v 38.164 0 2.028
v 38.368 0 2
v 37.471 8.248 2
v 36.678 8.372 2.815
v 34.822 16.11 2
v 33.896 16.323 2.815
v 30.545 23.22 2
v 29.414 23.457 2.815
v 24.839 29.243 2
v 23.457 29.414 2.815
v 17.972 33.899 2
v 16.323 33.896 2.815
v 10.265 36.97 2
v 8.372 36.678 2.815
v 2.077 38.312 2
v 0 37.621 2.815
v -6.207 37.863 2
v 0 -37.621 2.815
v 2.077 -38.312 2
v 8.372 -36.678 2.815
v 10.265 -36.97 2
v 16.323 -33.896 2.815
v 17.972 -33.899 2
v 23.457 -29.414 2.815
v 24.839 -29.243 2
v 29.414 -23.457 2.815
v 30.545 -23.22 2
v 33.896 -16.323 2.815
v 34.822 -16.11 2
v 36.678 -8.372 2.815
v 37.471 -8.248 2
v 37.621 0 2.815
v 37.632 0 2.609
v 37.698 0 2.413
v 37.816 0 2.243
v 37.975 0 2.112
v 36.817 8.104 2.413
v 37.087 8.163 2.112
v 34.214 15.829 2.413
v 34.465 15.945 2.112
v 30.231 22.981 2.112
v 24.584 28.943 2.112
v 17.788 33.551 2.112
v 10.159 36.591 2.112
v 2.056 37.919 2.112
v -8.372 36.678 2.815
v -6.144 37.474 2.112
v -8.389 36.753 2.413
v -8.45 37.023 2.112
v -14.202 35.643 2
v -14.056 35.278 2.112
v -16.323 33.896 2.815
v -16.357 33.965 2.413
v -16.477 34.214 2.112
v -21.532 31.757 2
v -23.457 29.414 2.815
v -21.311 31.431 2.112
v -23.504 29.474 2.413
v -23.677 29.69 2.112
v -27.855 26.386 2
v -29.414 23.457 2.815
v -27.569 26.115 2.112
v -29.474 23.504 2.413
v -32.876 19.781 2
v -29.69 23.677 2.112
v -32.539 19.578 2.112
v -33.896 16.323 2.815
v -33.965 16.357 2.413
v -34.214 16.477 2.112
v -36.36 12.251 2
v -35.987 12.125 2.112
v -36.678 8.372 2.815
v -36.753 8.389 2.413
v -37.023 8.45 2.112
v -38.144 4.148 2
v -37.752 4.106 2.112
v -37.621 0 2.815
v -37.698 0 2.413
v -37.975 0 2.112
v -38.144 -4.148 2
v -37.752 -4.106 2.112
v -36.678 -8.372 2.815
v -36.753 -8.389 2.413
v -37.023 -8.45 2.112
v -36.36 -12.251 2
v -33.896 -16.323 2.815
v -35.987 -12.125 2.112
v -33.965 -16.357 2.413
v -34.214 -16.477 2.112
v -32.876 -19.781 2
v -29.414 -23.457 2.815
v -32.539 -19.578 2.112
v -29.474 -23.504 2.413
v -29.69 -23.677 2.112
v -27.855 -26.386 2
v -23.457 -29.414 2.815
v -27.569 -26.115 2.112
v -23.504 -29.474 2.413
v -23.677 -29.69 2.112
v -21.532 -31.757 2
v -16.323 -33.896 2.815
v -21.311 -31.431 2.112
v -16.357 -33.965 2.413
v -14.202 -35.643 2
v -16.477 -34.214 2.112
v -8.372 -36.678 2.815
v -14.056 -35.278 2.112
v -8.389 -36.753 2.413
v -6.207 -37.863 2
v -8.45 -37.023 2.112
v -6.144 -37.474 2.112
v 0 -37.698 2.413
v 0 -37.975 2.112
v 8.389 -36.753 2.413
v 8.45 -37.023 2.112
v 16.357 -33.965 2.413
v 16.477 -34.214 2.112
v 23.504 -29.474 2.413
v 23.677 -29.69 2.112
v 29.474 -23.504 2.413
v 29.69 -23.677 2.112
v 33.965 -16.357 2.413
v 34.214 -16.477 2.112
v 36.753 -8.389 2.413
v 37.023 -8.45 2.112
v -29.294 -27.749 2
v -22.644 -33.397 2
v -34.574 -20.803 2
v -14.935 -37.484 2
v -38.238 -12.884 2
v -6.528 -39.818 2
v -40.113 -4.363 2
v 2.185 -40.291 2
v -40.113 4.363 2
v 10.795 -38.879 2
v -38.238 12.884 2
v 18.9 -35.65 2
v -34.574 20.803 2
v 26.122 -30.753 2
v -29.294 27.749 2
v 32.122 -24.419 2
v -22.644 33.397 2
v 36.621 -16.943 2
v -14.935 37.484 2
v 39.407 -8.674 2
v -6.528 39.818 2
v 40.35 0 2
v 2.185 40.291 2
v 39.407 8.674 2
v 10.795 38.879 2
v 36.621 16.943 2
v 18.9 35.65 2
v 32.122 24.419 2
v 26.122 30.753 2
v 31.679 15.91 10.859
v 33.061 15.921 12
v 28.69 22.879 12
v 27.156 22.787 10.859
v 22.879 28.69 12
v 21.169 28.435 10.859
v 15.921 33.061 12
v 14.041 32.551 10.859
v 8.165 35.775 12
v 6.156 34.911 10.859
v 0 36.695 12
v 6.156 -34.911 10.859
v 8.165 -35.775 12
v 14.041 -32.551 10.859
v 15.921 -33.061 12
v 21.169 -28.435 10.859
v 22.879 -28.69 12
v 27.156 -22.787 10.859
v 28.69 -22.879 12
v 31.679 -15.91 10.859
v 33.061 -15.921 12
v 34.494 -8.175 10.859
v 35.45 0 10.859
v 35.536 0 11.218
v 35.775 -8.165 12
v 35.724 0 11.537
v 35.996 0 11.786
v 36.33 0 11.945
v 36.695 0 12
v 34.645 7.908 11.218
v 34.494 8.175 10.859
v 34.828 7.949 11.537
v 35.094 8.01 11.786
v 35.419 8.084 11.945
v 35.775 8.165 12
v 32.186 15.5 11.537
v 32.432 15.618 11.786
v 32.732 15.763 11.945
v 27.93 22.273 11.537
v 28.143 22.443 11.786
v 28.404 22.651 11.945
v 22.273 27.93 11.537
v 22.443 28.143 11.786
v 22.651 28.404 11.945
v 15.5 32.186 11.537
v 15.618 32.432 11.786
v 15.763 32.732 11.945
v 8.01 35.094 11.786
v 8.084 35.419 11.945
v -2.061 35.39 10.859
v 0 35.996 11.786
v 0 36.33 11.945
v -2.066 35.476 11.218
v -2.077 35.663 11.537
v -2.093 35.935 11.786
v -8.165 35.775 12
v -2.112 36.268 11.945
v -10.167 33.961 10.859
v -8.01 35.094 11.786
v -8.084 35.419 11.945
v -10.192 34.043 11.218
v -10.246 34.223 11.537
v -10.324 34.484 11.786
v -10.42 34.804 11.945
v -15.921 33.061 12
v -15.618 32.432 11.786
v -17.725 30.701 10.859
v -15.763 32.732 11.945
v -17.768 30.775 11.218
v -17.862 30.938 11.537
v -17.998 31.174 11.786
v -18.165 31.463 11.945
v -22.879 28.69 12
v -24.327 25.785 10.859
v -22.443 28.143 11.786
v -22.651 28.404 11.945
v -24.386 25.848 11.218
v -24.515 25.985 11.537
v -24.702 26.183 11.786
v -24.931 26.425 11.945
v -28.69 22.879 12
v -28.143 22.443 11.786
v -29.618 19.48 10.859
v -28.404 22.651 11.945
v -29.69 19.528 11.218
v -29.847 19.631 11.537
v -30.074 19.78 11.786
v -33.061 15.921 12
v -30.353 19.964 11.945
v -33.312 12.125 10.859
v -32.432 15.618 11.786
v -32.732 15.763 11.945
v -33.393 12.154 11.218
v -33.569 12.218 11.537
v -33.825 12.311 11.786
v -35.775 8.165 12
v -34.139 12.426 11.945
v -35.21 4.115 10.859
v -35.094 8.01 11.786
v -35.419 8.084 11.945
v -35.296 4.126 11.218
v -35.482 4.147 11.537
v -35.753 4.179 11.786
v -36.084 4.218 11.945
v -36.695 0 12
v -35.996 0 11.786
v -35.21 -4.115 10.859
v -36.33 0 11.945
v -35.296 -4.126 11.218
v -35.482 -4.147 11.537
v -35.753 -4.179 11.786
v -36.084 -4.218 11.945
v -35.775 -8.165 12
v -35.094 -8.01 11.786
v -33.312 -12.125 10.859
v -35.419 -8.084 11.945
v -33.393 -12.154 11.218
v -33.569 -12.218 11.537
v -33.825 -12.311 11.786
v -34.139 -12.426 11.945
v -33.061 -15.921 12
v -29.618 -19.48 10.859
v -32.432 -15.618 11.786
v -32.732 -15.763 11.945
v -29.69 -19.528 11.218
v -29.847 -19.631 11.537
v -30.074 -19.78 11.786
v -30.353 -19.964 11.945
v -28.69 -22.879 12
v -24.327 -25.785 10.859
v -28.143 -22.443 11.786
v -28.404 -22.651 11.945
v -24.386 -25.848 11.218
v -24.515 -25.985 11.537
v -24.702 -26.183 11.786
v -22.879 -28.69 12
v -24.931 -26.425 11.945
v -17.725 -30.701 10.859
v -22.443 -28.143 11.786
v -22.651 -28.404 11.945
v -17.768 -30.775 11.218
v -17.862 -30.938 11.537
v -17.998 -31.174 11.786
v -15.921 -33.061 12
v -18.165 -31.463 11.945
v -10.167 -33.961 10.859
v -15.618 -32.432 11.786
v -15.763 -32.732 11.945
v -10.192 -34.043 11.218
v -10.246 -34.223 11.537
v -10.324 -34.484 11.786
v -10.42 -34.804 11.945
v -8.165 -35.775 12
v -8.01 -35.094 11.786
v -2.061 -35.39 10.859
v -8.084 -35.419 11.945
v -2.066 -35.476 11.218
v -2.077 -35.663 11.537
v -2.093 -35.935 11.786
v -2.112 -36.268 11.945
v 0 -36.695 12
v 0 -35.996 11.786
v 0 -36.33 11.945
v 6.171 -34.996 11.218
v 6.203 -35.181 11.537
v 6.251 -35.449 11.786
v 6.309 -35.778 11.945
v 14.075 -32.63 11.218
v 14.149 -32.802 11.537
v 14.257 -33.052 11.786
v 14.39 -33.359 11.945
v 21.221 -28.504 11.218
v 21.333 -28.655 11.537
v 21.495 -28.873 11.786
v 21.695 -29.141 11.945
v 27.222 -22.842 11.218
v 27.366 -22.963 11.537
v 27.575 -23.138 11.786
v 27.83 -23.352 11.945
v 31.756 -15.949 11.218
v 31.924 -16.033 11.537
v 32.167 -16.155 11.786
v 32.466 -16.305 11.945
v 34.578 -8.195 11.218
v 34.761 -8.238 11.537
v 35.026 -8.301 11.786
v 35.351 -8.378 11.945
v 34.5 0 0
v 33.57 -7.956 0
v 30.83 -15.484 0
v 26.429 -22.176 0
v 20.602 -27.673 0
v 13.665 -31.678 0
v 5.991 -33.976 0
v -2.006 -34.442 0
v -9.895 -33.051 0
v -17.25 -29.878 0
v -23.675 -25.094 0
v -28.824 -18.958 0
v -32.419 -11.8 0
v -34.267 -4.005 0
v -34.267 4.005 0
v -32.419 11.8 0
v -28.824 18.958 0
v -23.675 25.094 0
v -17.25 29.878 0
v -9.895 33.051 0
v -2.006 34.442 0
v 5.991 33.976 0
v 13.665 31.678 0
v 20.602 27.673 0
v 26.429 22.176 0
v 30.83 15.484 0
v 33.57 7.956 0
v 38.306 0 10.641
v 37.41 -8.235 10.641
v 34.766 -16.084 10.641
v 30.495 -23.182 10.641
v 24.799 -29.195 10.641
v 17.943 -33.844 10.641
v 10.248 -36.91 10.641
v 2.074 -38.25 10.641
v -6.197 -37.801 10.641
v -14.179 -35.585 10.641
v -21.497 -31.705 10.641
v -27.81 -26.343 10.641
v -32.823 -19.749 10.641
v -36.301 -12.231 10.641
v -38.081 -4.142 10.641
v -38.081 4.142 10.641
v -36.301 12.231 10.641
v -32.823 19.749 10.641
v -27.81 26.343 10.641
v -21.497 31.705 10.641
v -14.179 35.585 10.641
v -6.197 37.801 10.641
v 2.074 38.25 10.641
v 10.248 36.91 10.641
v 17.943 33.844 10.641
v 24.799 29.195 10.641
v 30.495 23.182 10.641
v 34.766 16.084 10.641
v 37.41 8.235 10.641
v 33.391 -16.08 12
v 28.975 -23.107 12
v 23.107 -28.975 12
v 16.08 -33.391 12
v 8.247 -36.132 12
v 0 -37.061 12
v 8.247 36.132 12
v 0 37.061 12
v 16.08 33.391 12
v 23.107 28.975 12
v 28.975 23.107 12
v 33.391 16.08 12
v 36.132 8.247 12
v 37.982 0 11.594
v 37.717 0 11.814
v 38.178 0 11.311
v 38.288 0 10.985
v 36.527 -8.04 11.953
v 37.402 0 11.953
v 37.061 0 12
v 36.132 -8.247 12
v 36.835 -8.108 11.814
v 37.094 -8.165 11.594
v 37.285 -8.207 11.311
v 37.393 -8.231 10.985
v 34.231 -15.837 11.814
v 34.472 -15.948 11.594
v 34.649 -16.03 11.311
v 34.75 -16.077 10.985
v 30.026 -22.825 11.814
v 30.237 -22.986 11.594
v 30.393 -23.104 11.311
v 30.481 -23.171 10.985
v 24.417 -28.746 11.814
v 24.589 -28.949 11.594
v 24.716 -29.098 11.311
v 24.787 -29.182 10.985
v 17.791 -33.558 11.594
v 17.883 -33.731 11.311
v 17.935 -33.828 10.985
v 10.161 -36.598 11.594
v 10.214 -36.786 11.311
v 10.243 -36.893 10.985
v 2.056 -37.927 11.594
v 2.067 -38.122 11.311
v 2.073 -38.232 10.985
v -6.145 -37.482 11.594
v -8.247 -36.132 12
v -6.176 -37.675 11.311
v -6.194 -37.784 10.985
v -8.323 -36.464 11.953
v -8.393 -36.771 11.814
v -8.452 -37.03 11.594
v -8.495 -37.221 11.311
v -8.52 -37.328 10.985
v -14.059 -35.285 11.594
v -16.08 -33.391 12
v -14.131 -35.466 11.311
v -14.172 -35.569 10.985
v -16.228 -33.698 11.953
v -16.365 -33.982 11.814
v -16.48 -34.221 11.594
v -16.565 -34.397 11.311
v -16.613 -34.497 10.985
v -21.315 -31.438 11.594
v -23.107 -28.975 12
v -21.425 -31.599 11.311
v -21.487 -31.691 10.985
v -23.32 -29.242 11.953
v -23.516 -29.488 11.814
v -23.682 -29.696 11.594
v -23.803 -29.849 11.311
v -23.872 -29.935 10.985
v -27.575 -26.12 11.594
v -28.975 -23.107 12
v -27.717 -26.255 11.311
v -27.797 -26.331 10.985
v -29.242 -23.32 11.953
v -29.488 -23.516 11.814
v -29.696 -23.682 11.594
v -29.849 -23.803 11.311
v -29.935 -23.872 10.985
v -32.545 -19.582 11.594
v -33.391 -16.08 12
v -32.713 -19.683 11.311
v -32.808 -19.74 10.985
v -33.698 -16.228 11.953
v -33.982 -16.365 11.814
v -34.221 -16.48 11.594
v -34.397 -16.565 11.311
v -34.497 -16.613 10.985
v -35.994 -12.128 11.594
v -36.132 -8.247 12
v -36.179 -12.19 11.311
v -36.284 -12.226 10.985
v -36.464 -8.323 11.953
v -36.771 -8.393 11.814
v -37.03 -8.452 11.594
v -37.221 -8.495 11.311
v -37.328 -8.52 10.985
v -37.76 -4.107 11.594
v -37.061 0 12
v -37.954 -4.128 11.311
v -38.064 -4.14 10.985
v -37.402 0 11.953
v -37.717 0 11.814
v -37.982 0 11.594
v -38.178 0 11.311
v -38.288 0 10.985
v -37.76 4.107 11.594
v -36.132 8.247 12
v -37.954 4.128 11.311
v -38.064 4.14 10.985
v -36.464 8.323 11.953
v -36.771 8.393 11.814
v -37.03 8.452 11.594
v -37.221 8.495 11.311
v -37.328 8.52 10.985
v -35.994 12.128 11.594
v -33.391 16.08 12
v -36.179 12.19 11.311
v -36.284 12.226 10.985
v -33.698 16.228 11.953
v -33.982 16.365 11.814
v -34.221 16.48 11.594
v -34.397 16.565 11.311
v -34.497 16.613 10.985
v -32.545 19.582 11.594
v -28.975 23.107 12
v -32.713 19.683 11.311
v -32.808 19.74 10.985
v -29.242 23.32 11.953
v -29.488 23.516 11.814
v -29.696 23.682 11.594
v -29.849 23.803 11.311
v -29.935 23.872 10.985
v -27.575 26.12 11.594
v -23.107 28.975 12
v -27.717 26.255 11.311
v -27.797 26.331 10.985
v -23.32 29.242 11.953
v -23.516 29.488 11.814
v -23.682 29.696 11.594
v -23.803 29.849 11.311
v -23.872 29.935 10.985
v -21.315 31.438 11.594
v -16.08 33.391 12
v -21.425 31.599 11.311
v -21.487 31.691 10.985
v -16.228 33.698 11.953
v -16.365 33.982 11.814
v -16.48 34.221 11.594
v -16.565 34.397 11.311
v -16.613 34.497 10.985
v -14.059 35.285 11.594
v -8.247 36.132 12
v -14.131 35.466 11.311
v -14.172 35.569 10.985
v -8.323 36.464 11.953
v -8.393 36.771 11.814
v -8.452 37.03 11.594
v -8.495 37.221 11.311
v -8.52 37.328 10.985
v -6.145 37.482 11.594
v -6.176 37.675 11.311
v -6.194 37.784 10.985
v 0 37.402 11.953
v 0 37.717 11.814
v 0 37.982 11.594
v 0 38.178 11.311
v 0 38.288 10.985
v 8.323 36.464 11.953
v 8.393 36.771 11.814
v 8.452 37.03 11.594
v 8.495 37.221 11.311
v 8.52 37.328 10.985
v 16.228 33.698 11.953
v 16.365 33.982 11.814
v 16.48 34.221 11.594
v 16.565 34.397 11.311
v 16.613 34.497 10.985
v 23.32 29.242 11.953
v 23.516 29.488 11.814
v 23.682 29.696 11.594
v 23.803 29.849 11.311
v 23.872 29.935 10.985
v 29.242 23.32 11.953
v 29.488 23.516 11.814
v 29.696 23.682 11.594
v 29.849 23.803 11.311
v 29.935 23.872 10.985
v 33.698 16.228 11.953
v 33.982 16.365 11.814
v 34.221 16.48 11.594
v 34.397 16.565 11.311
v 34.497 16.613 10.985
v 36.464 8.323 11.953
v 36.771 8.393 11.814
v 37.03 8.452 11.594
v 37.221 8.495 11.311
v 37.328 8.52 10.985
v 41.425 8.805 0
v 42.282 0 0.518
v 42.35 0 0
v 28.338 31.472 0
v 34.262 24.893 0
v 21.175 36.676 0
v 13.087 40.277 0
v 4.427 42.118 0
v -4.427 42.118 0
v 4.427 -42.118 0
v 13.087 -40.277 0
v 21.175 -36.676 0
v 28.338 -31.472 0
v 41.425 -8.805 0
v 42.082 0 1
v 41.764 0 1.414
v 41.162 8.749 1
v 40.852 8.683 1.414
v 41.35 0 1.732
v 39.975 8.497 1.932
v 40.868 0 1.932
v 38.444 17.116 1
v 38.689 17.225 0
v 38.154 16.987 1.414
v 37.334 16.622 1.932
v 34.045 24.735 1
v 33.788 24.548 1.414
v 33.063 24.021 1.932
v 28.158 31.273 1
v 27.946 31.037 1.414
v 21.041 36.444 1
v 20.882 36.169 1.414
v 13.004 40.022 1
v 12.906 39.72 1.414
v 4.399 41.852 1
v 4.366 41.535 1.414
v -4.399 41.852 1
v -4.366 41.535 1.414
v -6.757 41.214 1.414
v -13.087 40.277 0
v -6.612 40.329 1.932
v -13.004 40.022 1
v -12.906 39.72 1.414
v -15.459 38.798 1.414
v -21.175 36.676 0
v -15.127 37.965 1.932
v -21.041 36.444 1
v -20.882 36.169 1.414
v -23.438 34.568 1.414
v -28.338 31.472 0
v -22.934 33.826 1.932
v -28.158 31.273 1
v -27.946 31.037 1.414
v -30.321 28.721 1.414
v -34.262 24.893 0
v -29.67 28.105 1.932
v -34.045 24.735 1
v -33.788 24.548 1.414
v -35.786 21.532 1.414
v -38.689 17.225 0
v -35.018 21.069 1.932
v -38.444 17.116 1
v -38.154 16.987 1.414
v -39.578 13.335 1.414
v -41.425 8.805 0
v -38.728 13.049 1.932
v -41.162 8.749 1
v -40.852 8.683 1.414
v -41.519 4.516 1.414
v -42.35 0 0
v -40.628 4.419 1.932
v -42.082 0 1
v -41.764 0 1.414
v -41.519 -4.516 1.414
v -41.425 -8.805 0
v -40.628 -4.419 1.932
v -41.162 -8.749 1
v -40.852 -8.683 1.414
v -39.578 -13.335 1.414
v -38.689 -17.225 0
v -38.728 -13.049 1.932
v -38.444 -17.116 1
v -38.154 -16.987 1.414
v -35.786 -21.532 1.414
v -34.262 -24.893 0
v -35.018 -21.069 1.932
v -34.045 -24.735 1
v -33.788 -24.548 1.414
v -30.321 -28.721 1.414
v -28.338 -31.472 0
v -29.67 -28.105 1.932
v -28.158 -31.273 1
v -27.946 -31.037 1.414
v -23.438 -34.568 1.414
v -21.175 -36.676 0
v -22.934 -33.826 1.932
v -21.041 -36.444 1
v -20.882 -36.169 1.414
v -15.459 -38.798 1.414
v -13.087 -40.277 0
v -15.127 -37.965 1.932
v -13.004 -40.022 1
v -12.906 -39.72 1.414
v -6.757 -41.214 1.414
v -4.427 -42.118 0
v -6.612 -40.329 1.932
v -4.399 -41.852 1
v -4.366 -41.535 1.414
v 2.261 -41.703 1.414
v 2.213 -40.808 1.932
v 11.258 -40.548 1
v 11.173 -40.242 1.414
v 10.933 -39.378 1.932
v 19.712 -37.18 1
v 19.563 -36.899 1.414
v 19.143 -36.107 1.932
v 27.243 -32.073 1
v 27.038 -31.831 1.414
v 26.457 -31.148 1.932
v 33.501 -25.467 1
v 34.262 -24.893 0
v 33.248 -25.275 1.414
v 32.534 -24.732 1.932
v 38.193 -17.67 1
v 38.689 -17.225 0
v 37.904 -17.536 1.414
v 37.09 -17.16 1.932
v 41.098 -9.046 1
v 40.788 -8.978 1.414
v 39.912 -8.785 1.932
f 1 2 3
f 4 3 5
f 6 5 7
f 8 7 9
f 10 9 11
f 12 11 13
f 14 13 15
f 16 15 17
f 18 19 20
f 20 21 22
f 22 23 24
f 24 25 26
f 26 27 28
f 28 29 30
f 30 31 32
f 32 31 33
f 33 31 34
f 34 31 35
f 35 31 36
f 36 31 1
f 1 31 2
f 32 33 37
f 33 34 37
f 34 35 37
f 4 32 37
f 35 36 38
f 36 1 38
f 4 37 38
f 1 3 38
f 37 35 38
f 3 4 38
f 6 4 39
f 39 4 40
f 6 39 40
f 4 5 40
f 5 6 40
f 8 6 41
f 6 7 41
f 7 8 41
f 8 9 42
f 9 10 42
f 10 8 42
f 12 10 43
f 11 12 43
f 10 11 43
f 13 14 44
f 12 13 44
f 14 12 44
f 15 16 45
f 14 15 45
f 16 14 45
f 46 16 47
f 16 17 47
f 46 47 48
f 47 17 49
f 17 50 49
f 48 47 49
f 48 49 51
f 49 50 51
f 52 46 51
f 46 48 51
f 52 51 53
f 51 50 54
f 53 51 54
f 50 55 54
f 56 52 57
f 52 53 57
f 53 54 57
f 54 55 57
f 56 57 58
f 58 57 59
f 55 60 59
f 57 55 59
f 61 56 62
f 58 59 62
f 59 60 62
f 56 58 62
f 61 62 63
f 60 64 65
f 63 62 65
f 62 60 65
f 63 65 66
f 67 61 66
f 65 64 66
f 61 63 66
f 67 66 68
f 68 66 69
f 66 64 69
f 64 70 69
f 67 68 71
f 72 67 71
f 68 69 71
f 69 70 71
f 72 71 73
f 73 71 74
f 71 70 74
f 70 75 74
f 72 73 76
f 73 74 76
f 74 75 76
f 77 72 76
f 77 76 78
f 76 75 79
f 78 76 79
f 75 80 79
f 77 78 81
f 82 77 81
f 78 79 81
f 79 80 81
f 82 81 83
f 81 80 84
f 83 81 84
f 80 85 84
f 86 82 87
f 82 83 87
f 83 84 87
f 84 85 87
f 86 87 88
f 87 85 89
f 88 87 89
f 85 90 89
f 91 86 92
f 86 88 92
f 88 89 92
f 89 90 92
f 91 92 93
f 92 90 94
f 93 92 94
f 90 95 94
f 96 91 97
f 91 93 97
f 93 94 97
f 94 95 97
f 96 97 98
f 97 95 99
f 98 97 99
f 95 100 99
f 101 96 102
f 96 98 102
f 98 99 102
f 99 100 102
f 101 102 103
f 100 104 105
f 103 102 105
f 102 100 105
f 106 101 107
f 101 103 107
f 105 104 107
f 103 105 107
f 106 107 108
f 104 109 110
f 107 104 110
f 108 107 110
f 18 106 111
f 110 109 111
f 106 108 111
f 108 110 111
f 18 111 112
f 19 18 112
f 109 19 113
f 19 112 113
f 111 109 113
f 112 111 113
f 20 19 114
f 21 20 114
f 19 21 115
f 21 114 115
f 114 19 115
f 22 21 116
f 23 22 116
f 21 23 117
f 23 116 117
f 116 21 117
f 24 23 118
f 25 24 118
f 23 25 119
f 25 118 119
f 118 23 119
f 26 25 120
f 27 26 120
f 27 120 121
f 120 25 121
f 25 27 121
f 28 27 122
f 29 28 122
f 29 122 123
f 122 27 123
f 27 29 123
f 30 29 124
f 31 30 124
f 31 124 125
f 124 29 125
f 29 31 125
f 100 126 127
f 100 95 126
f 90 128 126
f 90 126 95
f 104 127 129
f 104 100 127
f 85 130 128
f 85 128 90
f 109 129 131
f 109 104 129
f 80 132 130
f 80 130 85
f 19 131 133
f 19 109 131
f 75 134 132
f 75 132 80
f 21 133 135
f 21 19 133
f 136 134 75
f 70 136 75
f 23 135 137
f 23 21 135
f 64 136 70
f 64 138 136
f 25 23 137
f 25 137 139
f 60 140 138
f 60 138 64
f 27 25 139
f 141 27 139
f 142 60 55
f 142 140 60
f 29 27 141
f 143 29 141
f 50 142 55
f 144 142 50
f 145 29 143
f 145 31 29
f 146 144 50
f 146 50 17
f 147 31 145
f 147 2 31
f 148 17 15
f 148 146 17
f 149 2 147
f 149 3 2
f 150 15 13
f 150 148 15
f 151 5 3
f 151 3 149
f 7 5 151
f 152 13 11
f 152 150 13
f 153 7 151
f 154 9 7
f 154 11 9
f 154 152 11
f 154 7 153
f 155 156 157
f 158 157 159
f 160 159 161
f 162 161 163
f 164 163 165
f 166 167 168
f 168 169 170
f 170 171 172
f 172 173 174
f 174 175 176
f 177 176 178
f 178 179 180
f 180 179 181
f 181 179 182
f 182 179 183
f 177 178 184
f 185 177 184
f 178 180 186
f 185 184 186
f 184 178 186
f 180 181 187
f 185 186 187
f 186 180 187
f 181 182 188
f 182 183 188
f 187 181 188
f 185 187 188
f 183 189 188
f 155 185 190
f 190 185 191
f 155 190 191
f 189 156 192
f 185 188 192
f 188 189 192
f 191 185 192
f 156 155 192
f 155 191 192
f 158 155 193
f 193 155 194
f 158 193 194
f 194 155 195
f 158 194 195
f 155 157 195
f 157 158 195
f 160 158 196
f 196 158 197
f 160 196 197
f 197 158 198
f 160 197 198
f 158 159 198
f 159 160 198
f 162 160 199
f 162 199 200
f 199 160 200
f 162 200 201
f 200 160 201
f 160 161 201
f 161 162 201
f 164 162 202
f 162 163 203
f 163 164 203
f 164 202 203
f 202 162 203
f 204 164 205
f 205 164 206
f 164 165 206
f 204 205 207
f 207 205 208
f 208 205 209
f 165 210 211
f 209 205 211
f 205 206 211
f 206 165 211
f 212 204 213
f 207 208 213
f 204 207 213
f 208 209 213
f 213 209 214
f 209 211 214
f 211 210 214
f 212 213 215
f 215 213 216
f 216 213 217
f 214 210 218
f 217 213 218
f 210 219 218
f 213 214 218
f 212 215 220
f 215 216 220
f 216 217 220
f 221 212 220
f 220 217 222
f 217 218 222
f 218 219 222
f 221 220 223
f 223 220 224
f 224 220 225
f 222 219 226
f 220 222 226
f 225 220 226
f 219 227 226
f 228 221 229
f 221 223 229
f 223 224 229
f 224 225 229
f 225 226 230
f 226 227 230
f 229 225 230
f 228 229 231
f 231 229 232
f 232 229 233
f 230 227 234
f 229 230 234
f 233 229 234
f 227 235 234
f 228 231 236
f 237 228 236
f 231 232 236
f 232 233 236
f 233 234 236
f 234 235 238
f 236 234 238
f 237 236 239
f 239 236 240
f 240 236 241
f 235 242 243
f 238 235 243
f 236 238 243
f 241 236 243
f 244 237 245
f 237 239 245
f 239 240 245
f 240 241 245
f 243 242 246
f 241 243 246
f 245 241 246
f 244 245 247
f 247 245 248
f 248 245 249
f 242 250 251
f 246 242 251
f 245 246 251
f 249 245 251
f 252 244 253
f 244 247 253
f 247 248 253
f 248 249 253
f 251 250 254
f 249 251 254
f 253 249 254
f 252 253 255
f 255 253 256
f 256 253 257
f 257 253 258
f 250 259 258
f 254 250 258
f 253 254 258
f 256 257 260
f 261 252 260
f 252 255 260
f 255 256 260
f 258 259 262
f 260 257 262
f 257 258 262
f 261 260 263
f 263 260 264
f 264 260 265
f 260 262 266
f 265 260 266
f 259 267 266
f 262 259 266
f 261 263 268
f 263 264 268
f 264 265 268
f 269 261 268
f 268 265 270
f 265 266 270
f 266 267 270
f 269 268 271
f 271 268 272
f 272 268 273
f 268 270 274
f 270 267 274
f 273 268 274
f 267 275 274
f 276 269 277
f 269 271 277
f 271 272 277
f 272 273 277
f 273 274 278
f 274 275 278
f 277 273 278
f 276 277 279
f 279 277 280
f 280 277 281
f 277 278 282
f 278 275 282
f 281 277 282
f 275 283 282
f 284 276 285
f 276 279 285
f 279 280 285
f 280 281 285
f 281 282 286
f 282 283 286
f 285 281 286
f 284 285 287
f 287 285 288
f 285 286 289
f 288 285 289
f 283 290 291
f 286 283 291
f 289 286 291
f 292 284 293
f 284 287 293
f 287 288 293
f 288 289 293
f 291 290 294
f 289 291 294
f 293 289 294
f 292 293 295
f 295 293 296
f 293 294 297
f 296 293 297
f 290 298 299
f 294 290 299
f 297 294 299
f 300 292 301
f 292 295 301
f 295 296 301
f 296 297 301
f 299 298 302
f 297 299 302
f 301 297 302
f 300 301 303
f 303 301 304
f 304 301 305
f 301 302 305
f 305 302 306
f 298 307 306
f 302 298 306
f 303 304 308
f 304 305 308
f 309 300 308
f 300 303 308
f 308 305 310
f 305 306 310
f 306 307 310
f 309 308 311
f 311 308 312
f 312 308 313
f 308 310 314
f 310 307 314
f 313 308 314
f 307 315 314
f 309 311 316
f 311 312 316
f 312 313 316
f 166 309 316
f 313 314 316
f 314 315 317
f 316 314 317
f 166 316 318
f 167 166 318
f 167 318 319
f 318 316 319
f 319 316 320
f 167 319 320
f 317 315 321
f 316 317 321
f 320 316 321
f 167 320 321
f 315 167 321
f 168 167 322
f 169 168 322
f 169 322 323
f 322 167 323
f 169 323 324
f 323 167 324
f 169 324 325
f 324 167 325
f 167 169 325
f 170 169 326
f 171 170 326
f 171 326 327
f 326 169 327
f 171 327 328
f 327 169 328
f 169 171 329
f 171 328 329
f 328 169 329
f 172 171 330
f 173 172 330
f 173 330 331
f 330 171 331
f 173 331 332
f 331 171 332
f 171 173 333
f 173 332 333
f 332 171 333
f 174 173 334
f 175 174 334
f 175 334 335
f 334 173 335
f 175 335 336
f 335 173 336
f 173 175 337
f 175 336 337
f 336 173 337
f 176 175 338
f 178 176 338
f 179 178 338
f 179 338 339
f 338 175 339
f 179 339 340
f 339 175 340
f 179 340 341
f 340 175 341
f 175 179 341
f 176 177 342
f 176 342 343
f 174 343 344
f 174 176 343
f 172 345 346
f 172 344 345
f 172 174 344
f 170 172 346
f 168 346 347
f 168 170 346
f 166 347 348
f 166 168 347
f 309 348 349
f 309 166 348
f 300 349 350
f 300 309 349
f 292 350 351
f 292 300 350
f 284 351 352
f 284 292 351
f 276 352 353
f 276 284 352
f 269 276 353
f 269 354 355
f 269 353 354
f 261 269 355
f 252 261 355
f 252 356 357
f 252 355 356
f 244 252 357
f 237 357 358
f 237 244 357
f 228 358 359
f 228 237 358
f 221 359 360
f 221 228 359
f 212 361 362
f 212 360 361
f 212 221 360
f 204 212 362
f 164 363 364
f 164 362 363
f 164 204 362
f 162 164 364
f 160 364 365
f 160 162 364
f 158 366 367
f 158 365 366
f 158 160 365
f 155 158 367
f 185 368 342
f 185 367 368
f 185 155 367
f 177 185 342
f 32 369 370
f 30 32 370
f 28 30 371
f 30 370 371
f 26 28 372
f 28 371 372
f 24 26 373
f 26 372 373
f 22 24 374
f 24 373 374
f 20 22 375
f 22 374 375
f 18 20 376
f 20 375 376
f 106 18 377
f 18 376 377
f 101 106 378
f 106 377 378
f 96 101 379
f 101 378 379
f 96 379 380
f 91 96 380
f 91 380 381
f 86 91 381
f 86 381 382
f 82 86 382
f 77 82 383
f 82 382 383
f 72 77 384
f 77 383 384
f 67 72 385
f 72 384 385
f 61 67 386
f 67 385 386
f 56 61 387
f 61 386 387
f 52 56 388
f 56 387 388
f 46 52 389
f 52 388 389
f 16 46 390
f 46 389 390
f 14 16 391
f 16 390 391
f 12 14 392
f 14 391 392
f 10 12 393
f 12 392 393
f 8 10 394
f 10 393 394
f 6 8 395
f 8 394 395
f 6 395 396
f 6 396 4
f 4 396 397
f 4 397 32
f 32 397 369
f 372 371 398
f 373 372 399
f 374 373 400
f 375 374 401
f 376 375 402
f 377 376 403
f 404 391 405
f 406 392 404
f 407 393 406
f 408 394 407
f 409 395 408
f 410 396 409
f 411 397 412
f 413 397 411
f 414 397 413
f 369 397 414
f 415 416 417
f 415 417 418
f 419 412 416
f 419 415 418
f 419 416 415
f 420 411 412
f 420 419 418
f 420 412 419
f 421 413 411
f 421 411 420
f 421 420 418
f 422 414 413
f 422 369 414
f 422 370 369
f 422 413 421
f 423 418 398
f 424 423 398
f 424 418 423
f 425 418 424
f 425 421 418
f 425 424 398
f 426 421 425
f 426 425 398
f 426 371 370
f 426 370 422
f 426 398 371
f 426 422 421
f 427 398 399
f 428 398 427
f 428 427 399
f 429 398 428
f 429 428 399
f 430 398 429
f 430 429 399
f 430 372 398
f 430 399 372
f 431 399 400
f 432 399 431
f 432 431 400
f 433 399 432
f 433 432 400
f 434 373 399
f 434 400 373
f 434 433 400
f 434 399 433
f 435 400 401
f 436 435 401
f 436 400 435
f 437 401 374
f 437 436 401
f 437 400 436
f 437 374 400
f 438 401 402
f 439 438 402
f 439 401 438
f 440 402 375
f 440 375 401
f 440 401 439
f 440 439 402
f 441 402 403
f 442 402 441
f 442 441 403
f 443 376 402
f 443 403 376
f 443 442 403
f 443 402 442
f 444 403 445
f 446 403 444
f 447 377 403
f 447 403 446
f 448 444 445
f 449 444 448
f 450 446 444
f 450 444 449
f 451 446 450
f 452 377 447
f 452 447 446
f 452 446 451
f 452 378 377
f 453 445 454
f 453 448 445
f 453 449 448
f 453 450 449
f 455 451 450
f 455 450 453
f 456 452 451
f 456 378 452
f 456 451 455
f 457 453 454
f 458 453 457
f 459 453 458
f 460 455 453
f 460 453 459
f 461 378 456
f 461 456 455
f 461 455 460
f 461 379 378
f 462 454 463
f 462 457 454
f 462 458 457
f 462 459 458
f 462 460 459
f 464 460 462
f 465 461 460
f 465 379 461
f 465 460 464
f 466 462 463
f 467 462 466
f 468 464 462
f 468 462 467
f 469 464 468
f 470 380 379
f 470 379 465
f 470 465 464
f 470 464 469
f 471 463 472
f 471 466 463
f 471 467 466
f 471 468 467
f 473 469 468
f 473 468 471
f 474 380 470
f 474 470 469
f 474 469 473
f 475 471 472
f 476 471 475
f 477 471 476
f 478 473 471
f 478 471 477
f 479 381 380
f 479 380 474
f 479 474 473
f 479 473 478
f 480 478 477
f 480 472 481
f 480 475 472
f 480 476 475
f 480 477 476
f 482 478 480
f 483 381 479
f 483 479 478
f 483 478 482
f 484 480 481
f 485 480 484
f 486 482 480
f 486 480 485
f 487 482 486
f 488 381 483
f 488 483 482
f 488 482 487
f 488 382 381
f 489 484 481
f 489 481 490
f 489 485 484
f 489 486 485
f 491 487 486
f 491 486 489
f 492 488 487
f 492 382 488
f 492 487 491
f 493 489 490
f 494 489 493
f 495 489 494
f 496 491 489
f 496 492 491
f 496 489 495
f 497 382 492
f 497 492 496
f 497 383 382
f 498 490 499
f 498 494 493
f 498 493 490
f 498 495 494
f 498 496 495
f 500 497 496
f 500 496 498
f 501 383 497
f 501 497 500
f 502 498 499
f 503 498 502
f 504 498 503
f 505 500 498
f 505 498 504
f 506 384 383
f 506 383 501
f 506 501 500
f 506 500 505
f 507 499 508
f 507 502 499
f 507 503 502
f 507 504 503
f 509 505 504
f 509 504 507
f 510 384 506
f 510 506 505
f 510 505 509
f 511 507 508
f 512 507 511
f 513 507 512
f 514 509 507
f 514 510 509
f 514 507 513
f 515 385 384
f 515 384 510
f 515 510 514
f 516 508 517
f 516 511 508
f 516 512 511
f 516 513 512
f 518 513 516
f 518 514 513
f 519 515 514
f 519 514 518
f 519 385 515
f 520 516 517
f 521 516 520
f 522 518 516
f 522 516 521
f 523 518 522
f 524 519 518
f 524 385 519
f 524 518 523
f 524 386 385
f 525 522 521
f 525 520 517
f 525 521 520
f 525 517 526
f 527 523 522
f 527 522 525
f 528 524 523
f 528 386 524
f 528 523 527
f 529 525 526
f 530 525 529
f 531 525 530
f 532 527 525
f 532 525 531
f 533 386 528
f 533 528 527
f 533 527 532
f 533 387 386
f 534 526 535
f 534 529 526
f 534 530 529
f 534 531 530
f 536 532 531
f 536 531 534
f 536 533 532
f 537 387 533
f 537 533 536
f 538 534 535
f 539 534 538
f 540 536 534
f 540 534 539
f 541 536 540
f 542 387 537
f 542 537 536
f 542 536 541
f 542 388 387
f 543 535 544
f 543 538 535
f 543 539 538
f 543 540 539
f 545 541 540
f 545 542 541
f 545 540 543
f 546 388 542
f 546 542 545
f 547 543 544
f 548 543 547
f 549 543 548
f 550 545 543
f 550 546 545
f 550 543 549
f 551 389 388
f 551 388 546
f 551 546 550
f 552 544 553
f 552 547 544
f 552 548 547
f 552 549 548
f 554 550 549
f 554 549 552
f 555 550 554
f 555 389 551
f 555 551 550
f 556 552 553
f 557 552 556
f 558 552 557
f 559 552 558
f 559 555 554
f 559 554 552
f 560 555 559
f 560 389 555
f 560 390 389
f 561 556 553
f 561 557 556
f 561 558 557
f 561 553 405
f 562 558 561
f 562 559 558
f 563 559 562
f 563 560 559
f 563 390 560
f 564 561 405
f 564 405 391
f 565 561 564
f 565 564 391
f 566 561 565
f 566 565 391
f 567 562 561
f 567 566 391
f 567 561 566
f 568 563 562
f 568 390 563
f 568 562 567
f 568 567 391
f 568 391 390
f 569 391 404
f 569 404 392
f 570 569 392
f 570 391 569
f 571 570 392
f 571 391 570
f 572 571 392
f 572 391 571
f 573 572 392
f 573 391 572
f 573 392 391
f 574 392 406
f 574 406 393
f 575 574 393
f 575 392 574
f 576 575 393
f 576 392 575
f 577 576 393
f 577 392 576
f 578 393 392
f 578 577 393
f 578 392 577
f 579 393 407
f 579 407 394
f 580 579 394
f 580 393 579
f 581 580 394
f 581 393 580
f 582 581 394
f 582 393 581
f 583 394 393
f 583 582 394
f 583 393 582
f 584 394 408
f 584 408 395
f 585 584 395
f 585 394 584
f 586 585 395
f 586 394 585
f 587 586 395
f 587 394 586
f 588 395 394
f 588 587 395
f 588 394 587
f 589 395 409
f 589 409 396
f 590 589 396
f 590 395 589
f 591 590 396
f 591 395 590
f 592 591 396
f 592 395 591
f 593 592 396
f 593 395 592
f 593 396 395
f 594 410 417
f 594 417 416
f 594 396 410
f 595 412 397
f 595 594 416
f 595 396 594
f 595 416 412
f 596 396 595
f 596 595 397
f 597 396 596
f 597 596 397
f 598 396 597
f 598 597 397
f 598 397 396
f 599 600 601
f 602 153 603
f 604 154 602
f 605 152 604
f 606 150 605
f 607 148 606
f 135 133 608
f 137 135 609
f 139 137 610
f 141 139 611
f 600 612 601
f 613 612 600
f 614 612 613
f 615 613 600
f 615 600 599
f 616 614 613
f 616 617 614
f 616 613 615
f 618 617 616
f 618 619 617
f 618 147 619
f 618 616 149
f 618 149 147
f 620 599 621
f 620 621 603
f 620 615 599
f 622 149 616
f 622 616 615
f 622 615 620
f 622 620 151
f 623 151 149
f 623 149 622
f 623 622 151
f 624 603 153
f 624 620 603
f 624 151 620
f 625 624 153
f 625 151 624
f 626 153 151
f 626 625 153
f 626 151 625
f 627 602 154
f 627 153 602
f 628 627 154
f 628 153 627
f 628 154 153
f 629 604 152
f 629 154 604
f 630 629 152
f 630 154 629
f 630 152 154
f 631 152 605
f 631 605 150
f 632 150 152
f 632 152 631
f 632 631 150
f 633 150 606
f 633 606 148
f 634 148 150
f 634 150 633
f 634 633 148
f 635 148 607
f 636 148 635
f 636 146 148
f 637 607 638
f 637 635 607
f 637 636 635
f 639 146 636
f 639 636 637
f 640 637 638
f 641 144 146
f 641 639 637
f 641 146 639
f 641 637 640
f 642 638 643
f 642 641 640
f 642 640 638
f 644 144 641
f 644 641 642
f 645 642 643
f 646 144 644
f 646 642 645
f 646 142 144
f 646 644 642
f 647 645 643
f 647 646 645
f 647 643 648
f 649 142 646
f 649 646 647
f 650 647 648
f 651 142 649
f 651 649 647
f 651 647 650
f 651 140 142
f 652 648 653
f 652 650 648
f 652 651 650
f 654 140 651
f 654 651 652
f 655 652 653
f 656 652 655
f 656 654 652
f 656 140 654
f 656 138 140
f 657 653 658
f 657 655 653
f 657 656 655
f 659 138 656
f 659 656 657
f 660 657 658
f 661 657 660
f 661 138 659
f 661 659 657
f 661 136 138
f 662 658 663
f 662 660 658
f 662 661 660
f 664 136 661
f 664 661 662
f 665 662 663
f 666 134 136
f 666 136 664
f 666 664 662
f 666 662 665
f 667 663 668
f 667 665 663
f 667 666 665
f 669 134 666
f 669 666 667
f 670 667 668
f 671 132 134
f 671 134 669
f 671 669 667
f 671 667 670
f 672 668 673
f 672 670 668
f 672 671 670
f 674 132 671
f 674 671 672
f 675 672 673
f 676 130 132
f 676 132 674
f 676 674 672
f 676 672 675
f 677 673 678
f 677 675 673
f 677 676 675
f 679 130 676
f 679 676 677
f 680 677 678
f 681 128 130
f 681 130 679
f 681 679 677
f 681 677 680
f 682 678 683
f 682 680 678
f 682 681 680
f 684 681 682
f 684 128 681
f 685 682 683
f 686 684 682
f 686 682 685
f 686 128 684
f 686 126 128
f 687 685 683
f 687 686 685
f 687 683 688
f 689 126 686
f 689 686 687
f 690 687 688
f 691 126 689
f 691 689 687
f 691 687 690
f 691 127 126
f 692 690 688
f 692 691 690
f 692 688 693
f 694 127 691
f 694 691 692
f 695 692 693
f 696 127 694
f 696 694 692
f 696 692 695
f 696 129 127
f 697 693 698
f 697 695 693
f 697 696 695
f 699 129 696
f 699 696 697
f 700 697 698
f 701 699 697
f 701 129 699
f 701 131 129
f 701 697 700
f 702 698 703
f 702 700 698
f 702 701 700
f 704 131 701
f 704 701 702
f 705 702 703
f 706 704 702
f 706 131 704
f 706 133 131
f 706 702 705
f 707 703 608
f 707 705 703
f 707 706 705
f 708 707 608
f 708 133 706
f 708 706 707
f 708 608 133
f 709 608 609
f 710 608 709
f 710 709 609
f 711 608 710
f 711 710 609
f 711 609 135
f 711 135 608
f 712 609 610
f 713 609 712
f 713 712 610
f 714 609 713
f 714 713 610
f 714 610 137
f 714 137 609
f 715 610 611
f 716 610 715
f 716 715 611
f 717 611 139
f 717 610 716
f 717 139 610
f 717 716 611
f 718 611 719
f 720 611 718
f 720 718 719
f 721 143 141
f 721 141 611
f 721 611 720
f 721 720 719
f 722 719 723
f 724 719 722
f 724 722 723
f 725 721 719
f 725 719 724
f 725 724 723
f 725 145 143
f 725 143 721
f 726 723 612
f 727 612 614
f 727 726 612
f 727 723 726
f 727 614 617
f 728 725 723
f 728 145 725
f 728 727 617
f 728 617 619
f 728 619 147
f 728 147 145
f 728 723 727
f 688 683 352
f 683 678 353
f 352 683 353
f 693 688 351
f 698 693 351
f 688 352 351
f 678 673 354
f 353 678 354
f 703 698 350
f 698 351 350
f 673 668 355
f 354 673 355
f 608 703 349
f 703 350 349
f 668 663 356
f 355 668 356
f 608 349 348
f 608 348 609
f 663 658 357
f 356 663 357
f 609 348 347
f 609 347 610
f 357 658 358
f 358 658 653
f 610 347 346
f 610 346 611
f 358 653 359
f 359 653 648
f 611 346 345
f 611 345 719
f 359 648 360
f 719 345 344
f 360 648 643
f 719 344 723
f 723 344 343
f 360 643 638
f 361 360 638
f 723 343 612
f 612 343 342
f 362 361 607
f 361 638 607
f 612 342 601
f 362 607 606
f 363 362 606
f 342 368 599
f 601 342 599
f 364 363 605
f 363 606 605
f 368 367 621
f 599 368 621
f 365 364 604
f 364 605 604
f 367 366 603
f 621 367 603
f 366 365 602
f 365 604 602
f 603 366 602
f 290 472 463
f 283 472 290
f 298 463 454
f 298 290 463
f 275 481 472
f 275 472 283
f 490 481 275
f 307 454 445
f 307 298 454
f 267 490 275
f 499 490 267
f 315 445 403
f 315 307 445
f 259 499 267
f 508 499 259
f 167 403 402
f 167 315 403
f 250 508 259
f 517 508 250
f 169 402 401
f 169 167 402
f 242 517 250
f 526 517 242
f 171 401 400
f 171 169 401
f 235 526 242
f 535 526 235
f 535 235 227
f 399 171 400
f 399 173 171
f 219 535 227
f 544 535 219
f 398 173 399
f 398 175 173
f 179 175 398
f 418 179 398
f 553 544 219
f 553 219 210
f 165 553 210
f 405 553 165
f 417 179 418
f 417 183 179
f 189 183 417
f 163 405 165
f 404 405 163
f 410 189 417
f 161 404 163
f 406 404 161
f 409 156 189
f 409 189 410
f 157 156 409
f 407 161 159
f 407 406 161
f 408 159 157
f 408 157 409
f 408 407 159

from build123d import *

# Parameters (mm, degrees)
F0_R      = 42
F0_R_2    = 36.5
F1_DEPTH  = 2
F4_R      = 42.35
F4_R_2    = 42
F5_DEPTH  = 2
F6_R      = 1.99999
F7_R      = 37.375
F7_R_2    = 34.5
F8_DEPTH  = 12
F8_TAPER  = -5
F9_R      = 38.4248639623
F10_DEPTH = 25
F11_R     = 34.5
F12_DEPTH = 25
F12_TAPER = -5
F13_R     = 1.25
F14_R     = 0.75


# Not quite as in the source:
# - a fillet or chamfer is up to 0.001 mm smaller than in the source, because OpenCascade refuses the exact size


with BuildPart() as f1:
    # F0 (on Top) → F1 (new body)
    with BuildSketch(Plane.XY):
        Circle(F0_R)
        Circle(F0_R_2, mode=Mode.SUBTRACT)
    extrude(amount=F1_DEPTH)

    # F2 (on Front) → F3 (revolve)
    with BuildSketch(Plane.XZ):
        with BuildLine():
            Line((36.5, 0), (36.5, 2))
            Line((36.5, 2), (35.5, 2))
            ThreePointArc((35.5, 2), (34.7928932188, 2.2928932188), (34.5, 3))
            Line((34.5, 3), (34.5, 14.1715728753))
            ThreePointArc((34.5, 14.1715728753), (34.6835034191, 14.7489231444), (35.1666666667, 15.1143819168))
            ThreePointArc((35.1666666667, 15.1143819168), (35.6547005384, 18.6329931619), (32.5, 17))
            Line((32.5, 17), (32.5, 2))
            ThreePointArc((32.5, 2), (33.0857864376, 0.5857864376), (34.5, 0))
            Line((34.5, 0), (36.5, 0))
        make_face()
    revolve(axis=Axis((0, 0, 63.5549128056), (0, 0, 1)))

    # F4 (on face) → F5 (join)
    with BuildSketch(Plane.XY.offset(2)):
        Circle(F4_R)
        Circle(F4_R_2, mode=Mode.SUBTRACT)
    extrude(amount=-F5_DEPTH)

    # F6 (radius 2 in the source; OpenCascade refuses exactly that, so slightly less here)
    f6_edges = [f1.edges().sort_by_distance(p)[0] for p in [
        (-42.35, 0, 2),
    ]]
    fillet(f6_edges, radius=F6_R)

    # F7 (on face) → F8 (join)
    with BuildSketch(Plane(origin=(0, 0, 0), x_dir=(1, 0, 0), z_dir=(0, 0, -1))):
        Circle(F7_R)
        Circle(F7_R_2, mode=Mode.SUBTRACT)
    extrude(amount=-F8_DEPTH, taper=F8_TAPER)

    # F9 (on face) → F10 (cut)
    with BuildSketch(Plane.XY.offset(12)):
        Circle(F9_R)
    extrude(amount=F10_DEPTH, mode=Mode.SUBTRACT)

    # F11 (on face) → F12 (cut)
    with BuildSketch(Plane(origin=(0, 0, 0), x_dir=(1, 0, 0), z_dir=(0, 0, -1))):
        Circle(F11_R)
    extrude(amount=-F12_DEPTH, taper=F12_TAPER, mode=Mode.SUBTRACT)

    # F13
    f13_edges = [f1.edges().sort_by_distance(p)[0] for p in [
        (-38.424864, 0, 12),
        (-35.549864, 0, 12),
    ]]
    fillet(f13_edges, radius=F13_R)

    # F14
    f14_edges = [f1.edges().sort_by_distance(p)[0] for p in [
        (-37.549977, 0, 2),
    ]]
    fillet(f14_edges, radius=F14_R)


solid = f1.part
